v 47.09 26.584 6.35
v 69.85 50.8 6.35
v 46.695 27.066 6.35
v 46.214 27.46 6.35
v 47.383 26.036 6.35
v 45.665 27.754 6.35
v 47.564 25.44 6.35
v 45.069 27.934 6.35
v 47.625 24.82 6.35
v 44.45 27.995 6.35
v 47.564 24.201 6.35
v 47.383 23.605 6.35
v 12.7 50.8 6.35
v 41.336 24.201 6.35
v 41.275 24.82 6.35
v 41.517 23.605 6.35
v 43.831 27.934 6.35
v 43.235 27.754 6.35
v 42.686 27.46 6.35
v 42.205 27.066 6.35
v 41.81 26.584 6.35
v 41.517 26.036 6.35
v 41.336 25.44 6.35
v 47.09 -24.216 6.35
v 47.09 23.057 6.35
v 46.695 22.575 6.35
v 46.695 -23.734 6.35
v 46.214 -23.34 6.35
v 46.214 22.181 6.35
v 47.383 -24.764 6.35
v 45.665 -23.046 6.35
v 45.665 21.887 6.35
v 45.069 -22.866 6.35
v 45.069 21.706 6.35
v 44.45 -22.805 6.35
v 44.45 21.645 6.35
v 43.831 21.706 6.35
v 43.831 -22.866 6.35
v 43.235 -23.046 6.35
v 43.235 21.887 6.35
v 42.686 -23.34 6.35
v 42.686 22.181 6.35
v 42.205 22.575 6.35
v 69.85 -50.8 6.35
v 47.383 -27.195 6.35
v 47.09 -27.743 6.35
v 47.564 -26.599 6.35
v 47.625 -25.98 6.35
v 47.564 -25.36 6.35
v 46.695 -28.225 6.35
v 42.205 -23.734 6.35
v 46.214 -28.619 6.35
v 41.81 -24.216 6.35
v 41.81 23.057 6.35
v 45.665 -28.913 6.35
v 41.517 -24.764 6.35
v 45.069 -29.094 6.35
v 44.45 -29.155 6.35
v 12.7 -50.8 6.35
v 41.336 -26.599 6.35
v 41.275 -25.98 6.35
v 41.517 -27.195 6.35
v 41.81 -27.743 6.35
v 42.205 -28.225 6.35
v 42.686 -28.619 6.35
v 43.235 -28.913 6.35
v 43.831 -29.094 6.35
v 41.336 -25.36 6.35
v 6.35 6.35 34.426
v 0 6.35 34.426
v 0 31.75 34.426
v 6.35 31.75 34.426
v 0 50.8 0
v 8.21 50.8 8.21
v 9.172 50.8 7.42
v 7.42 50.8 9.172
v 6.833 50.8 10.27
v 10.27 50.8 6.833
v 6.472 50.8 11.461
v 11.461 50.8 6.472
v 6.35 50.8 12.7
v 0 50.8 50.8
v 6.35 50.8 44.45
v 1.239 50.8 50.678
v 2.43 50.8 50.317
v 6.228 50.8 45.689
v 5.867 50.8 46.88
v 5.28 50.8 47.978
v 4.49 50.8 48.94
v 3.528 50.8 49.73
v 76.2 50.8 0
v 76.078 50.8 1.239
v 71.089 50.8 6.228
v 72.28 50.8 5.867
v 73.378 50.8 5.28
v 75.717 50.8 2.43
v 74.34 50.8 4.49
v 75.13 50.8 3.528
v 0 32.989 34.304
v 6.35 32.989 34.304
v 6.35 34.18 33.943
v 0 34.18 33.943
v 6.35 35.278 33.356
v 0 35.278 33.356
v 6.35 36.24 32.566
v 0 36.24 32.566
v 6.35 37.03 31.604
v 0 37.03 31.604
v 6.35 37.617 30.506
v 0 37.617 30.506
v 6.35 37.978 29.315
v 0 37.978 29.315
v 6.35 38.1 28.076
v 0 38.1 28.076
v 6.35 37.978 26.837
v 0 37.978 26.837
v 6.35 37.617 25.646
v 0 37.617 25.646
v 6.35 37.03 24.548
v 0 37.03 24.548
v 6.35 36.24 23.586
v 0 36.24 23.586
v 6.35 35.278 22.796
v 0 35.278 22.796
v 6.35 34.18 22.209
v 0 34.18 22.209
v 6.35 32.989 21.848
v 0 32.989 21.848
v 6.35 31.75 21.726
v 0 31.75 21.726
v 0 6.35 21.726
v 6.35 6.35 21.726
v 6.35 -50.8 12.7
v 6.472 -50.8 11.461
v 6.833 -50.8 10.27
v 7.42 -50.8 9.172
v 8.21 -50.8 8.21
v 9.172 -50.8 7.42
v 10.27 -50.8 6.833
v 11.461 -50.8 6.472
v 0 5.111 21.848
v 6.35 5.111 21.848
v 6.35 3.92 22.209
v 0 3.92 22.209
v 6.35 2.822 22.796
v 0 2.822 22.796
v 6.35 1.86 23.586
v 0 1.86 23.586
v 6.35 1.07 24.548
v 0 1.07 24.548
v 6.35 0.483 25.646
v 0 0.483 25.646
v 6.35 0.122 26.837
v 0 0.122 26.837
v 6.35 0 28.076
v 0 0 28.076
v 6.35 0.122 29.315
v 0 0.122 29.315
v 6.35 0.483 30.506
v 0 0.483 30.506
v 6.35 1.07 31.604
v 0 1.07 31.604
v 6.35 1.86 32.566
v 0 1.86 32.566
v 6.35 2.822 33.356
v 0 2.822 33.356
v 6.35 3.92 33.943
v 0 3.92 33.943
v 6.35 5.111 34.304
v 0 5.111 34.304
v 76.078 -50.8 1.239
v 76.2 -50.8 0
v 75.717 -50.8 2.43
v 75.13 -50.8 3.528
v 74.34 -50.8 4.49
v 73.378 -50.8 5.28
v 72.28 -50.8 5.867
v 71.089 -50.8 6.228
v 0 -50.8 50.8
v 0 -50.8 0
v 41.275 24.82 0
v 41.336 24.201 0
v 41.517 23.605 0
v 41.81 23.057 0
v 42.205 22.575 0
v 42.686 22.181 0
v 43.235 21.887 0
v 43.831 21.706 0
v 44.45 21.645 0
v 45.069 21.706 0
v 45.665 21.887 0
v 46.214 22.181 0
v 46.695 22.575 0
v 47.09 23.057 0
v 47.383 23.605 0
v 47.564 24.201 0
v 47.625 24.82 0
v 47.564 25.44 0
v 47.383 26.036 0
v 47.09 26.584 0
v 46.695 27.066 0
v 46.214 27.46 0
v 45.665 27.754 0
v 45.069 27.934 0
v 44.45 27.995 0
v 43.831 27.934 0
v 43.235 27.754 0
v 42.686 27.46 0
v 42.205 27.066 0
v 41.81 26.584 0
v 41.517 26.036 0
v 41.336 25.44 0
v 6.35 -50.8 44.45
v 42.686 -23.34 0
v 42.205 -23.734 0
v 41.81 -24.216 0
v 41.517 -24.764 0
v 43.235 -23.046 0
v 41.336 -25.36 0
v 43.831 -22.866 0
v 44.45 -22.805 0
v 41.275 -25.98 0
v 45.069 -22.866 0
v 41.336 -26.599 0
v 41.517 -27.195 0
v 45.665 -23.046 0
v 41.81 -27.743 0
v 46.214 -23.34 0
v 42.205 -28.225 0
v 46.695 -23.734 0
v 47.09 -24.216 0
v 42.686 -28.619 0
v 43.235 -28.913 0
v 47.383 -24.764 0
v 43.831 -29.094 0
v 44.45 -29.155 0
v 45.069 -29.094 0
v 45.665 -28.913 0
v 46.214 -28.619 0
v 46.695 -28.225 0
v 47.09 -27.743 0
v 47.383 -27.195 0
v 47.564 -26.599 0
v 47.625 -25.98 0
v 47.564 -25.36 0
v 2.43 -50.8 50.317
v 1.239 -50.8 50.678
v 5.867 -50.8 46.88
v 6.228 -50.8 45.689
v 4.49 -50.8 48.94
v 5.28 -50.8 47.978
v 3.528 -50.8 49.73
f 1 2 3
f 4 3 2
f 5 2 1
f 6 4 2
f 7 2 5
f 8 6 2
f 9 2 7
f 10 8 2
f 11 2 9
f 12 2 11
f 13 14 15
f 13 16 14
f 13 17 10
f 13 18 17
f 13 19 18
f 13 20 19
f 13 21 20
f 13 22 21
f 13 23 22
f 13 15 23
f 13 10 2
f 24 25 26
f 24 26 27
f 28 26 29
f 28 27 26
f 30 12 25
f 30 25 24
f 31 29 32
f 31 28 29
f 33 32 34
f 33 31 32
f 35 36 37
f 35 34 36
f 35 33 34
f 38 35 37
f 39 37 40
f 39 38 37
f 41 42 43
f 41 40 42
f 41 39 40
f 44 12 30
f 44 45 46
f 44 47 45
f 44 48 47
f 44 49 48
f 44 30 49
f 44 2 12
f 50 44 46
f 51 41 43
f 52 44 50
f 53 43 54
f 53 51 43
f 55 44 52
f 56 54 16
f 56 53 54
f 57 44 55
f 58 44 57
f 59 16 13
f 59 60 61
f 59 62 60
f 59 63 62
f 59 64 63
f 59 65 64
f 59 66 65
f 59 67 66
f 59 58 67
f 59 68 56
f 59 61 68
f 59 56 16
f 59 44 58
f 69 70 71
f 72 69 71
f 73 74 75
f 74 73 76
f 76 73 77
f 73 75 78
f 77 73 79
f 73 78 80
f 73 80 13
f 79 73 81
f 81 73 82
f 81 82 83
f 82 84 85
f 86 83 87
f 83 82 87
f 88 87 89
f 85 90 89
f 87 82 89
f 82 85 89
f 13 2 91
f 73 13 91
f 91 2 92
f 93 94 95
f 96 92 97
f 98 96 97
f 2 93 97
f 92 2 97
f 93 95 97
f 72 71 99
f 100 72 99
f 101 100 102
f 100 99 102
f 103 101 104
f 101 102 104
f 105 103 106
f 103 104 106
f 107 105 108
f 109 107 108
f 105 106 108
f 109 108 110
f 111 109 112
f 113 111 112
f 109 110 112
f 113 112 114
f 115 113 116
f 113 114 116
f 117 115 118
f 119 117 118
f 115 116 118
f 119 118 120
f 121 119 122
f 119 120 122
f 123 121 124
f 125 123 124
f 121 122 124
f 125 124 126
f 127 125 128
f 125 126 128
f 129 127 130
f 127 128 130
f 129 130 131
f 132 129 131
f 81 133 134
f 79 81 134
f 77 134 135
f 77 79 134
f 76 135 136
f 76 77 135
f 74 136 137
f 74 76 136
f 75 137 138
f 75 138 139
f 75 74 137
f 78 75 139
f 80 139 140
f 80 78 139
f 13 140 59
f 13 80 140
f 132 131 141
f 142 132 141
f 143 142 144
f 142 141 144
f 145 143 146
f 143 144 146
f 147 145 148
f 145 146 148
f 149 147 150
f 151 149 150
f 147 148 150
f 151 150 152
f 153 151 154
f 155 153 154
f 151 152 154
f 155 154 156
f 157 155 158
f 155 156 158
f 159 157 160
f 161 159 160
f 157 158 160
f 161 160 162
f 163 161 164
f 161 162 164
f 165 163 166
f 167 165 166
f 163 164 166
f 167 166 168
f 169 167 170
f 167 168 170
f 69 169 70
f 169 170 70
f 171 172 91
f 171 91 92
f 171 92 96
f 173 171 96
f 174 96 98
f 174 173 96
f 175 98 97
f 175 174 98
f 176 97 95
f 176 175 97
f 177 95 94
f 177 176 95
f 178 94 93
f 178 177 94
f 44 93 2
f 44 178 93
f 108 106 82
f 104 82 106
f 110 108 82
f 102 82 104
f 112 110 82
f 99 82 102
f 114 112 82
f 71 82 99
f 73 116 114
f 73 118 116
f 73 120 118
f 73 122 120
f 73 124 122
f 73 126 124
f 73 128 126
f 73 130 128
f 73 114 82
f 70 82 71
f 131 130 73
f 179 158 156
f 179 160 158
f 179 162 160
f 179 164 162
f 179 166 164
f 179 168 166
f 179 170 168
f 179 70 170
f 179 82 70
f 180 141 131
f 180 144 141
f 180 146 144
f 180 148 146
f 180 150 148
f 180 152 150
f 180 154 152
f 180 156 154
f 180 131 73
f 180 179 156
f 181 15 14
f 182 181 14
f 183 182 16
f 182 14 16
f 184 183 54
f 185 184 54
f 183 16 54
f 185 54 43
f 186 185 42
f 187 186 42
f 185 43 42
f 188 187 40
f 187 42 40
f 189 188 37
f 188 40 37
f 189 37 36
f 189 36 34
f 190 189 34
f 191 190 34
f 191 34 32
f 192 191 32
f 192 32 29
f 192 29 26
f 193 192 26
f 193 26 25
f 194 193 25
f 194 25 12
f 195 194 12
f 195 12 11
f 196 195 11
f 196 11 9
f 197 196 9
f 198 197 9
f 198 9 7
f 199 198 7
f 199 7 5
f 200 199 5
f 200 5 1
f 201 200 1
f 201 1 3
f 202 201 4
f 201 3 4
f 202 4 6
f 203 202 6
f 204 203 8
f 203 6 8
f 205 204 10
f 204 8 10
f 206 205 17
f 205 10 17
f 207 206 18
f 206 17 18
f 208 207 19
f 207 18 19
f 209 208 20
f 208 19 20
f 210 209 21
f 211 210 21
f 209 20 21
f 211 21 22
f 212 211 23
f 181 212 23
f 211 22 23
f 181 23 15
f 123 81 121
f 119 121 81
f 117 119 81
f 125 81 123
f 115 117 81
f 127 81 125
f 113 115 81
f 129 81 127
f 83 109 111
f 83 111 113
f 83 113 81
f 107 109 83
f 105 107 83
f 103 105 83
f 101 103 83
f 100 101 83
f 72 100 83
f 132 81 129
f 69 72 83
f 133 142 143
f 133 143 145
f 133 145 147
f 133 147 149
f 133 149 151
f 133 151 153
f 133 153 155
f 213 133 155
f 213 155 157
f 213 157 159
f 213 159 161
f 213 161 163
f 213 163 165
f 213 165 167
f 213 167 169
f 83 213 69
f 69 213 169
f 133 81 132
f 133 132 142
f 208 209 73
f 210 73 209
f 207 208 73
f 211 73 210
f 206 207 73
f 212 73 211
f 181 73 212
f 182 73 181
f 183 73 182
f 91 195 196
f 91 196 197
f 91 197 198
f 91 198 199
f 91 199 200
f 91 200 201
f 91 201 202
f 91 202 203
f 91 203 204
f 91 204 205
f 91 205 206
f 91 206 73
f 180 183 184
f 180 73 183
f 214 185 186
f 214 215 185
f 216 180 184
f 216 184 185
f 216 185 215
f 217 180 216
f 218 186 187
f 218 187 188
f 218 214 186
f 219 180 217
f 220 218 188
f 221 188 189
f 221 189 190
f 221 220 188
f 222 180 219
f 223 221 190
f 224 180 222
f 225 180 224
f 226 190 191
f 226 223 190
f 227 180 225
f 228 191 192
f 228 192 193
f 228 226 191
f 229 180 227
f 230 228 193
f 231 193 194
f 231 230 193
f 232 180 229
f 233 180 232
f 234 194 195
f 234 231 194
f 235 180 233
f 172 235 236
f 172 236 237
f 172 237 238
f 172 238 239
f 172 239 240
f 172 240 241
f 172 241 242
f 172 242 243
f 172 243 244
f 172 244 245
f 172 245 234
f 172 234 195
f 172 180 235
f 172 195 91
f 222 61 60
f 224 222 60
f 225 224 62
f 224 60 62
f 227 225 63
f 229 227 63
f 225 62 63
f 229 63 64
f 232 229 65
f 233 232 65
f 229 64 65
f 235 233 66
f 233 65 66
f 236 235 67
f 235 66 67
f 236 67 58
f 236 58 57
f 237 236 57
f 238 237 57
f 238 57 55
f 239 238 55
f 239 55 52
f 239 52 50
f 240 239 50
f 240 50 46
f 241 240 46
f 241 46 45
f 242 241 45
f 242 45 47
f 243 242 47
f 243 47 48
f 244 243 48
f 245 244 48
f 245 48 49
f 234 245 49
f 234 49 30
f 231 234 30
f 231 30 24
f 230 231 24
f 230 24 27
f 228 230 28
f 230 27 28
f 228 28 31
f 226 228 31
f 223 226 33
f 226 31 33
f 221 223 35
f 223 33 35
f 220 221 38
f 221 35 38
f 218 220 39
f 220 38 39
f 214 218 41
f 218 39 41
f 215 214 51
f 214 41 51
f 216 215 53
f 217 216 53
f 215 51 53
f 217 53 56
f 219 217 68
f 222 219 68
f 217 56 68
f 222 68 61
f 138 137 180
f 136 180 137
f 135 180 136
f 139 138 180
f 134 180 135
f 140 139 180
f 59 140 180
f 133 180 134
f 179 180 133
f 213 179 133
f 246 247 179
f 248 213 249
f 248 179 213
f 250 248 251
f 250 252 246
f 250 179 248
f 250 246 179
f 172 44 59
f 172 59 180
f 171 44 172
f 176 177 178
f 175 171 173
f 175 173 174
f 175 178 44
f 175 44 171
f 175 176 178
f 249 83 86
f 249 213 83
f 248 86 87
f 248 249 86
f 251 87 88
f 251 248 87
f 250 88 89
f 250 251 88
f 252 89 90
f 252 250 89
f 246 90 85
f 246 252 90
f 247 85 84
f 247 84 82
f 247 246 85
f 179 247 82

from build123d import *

# Parameters (mm, degrees)
F1_DEPTH = 50.8
F2_R     = 6.35
F4_D     = 6.35
F6_DEPTH = 76.201


with BuildPart() as f1:
    # F0 (on Front) → F1 (new body, symmetric)
    with BuildSketch(Plane.XZ):
        with BuildLine():
            ThreePointArc((6.35, 44.45), (4.490128, 48.940128), (0, 50.8))
            Line((0, 50.8), (0, 0))
            Line((0, 0), (76.2, 0))
            ThreePointArc((76.2, 0), (74.340128, 4.490128), (69.85, 6.35))
            Line((69.85, 6.35), (6.35, 6.35))
            Line((6.35, 6.35), (6.35, 44.45))
        make_face()
    extrude(amount=F1_DEPTH, both=True)

    # F2
    f2_edges = [f1.edges().sort_by_distance(p)[0] for p in [
        (6.35, 0, 6.35),
    ]]
    fillet(f2_edges, radius=F2_R)

    # F4 (through all)
    with Locations(Plane(origin=(0, 0, 0), x_dir=(1, 0, 0), z_dir=(0, 0, -1))):
        with Locations((44.45, 25.979519), (44.45, -24.820481)):
            Hole(F4_D / 2)

    # F5 (on face) → F6 (cut, through all)
    with BuildSketch(Plane(origin=(0, 0, 0), x_dir=(0, -1, 0), z_dir=(-1, 0, 0))):
        with BuildLine():
            Line((-6.35, 34.426071), (-31.75, 34.426071))
            ThreePointArc((-31.75, 34.426071), (-38.1, 28.076071), (-31.75, 21.726071))
            Line((-31.75, 21.726071), (-6.35, 21.726071))
            ThreePointArc((-6.35, 21.726071), (0, 28.076071), (-6.35, 34.426071))
        make_face()
    extrude(amount=-F6_DEPTH, mode=Mode.SUBTRACT)


solid = f1.part
